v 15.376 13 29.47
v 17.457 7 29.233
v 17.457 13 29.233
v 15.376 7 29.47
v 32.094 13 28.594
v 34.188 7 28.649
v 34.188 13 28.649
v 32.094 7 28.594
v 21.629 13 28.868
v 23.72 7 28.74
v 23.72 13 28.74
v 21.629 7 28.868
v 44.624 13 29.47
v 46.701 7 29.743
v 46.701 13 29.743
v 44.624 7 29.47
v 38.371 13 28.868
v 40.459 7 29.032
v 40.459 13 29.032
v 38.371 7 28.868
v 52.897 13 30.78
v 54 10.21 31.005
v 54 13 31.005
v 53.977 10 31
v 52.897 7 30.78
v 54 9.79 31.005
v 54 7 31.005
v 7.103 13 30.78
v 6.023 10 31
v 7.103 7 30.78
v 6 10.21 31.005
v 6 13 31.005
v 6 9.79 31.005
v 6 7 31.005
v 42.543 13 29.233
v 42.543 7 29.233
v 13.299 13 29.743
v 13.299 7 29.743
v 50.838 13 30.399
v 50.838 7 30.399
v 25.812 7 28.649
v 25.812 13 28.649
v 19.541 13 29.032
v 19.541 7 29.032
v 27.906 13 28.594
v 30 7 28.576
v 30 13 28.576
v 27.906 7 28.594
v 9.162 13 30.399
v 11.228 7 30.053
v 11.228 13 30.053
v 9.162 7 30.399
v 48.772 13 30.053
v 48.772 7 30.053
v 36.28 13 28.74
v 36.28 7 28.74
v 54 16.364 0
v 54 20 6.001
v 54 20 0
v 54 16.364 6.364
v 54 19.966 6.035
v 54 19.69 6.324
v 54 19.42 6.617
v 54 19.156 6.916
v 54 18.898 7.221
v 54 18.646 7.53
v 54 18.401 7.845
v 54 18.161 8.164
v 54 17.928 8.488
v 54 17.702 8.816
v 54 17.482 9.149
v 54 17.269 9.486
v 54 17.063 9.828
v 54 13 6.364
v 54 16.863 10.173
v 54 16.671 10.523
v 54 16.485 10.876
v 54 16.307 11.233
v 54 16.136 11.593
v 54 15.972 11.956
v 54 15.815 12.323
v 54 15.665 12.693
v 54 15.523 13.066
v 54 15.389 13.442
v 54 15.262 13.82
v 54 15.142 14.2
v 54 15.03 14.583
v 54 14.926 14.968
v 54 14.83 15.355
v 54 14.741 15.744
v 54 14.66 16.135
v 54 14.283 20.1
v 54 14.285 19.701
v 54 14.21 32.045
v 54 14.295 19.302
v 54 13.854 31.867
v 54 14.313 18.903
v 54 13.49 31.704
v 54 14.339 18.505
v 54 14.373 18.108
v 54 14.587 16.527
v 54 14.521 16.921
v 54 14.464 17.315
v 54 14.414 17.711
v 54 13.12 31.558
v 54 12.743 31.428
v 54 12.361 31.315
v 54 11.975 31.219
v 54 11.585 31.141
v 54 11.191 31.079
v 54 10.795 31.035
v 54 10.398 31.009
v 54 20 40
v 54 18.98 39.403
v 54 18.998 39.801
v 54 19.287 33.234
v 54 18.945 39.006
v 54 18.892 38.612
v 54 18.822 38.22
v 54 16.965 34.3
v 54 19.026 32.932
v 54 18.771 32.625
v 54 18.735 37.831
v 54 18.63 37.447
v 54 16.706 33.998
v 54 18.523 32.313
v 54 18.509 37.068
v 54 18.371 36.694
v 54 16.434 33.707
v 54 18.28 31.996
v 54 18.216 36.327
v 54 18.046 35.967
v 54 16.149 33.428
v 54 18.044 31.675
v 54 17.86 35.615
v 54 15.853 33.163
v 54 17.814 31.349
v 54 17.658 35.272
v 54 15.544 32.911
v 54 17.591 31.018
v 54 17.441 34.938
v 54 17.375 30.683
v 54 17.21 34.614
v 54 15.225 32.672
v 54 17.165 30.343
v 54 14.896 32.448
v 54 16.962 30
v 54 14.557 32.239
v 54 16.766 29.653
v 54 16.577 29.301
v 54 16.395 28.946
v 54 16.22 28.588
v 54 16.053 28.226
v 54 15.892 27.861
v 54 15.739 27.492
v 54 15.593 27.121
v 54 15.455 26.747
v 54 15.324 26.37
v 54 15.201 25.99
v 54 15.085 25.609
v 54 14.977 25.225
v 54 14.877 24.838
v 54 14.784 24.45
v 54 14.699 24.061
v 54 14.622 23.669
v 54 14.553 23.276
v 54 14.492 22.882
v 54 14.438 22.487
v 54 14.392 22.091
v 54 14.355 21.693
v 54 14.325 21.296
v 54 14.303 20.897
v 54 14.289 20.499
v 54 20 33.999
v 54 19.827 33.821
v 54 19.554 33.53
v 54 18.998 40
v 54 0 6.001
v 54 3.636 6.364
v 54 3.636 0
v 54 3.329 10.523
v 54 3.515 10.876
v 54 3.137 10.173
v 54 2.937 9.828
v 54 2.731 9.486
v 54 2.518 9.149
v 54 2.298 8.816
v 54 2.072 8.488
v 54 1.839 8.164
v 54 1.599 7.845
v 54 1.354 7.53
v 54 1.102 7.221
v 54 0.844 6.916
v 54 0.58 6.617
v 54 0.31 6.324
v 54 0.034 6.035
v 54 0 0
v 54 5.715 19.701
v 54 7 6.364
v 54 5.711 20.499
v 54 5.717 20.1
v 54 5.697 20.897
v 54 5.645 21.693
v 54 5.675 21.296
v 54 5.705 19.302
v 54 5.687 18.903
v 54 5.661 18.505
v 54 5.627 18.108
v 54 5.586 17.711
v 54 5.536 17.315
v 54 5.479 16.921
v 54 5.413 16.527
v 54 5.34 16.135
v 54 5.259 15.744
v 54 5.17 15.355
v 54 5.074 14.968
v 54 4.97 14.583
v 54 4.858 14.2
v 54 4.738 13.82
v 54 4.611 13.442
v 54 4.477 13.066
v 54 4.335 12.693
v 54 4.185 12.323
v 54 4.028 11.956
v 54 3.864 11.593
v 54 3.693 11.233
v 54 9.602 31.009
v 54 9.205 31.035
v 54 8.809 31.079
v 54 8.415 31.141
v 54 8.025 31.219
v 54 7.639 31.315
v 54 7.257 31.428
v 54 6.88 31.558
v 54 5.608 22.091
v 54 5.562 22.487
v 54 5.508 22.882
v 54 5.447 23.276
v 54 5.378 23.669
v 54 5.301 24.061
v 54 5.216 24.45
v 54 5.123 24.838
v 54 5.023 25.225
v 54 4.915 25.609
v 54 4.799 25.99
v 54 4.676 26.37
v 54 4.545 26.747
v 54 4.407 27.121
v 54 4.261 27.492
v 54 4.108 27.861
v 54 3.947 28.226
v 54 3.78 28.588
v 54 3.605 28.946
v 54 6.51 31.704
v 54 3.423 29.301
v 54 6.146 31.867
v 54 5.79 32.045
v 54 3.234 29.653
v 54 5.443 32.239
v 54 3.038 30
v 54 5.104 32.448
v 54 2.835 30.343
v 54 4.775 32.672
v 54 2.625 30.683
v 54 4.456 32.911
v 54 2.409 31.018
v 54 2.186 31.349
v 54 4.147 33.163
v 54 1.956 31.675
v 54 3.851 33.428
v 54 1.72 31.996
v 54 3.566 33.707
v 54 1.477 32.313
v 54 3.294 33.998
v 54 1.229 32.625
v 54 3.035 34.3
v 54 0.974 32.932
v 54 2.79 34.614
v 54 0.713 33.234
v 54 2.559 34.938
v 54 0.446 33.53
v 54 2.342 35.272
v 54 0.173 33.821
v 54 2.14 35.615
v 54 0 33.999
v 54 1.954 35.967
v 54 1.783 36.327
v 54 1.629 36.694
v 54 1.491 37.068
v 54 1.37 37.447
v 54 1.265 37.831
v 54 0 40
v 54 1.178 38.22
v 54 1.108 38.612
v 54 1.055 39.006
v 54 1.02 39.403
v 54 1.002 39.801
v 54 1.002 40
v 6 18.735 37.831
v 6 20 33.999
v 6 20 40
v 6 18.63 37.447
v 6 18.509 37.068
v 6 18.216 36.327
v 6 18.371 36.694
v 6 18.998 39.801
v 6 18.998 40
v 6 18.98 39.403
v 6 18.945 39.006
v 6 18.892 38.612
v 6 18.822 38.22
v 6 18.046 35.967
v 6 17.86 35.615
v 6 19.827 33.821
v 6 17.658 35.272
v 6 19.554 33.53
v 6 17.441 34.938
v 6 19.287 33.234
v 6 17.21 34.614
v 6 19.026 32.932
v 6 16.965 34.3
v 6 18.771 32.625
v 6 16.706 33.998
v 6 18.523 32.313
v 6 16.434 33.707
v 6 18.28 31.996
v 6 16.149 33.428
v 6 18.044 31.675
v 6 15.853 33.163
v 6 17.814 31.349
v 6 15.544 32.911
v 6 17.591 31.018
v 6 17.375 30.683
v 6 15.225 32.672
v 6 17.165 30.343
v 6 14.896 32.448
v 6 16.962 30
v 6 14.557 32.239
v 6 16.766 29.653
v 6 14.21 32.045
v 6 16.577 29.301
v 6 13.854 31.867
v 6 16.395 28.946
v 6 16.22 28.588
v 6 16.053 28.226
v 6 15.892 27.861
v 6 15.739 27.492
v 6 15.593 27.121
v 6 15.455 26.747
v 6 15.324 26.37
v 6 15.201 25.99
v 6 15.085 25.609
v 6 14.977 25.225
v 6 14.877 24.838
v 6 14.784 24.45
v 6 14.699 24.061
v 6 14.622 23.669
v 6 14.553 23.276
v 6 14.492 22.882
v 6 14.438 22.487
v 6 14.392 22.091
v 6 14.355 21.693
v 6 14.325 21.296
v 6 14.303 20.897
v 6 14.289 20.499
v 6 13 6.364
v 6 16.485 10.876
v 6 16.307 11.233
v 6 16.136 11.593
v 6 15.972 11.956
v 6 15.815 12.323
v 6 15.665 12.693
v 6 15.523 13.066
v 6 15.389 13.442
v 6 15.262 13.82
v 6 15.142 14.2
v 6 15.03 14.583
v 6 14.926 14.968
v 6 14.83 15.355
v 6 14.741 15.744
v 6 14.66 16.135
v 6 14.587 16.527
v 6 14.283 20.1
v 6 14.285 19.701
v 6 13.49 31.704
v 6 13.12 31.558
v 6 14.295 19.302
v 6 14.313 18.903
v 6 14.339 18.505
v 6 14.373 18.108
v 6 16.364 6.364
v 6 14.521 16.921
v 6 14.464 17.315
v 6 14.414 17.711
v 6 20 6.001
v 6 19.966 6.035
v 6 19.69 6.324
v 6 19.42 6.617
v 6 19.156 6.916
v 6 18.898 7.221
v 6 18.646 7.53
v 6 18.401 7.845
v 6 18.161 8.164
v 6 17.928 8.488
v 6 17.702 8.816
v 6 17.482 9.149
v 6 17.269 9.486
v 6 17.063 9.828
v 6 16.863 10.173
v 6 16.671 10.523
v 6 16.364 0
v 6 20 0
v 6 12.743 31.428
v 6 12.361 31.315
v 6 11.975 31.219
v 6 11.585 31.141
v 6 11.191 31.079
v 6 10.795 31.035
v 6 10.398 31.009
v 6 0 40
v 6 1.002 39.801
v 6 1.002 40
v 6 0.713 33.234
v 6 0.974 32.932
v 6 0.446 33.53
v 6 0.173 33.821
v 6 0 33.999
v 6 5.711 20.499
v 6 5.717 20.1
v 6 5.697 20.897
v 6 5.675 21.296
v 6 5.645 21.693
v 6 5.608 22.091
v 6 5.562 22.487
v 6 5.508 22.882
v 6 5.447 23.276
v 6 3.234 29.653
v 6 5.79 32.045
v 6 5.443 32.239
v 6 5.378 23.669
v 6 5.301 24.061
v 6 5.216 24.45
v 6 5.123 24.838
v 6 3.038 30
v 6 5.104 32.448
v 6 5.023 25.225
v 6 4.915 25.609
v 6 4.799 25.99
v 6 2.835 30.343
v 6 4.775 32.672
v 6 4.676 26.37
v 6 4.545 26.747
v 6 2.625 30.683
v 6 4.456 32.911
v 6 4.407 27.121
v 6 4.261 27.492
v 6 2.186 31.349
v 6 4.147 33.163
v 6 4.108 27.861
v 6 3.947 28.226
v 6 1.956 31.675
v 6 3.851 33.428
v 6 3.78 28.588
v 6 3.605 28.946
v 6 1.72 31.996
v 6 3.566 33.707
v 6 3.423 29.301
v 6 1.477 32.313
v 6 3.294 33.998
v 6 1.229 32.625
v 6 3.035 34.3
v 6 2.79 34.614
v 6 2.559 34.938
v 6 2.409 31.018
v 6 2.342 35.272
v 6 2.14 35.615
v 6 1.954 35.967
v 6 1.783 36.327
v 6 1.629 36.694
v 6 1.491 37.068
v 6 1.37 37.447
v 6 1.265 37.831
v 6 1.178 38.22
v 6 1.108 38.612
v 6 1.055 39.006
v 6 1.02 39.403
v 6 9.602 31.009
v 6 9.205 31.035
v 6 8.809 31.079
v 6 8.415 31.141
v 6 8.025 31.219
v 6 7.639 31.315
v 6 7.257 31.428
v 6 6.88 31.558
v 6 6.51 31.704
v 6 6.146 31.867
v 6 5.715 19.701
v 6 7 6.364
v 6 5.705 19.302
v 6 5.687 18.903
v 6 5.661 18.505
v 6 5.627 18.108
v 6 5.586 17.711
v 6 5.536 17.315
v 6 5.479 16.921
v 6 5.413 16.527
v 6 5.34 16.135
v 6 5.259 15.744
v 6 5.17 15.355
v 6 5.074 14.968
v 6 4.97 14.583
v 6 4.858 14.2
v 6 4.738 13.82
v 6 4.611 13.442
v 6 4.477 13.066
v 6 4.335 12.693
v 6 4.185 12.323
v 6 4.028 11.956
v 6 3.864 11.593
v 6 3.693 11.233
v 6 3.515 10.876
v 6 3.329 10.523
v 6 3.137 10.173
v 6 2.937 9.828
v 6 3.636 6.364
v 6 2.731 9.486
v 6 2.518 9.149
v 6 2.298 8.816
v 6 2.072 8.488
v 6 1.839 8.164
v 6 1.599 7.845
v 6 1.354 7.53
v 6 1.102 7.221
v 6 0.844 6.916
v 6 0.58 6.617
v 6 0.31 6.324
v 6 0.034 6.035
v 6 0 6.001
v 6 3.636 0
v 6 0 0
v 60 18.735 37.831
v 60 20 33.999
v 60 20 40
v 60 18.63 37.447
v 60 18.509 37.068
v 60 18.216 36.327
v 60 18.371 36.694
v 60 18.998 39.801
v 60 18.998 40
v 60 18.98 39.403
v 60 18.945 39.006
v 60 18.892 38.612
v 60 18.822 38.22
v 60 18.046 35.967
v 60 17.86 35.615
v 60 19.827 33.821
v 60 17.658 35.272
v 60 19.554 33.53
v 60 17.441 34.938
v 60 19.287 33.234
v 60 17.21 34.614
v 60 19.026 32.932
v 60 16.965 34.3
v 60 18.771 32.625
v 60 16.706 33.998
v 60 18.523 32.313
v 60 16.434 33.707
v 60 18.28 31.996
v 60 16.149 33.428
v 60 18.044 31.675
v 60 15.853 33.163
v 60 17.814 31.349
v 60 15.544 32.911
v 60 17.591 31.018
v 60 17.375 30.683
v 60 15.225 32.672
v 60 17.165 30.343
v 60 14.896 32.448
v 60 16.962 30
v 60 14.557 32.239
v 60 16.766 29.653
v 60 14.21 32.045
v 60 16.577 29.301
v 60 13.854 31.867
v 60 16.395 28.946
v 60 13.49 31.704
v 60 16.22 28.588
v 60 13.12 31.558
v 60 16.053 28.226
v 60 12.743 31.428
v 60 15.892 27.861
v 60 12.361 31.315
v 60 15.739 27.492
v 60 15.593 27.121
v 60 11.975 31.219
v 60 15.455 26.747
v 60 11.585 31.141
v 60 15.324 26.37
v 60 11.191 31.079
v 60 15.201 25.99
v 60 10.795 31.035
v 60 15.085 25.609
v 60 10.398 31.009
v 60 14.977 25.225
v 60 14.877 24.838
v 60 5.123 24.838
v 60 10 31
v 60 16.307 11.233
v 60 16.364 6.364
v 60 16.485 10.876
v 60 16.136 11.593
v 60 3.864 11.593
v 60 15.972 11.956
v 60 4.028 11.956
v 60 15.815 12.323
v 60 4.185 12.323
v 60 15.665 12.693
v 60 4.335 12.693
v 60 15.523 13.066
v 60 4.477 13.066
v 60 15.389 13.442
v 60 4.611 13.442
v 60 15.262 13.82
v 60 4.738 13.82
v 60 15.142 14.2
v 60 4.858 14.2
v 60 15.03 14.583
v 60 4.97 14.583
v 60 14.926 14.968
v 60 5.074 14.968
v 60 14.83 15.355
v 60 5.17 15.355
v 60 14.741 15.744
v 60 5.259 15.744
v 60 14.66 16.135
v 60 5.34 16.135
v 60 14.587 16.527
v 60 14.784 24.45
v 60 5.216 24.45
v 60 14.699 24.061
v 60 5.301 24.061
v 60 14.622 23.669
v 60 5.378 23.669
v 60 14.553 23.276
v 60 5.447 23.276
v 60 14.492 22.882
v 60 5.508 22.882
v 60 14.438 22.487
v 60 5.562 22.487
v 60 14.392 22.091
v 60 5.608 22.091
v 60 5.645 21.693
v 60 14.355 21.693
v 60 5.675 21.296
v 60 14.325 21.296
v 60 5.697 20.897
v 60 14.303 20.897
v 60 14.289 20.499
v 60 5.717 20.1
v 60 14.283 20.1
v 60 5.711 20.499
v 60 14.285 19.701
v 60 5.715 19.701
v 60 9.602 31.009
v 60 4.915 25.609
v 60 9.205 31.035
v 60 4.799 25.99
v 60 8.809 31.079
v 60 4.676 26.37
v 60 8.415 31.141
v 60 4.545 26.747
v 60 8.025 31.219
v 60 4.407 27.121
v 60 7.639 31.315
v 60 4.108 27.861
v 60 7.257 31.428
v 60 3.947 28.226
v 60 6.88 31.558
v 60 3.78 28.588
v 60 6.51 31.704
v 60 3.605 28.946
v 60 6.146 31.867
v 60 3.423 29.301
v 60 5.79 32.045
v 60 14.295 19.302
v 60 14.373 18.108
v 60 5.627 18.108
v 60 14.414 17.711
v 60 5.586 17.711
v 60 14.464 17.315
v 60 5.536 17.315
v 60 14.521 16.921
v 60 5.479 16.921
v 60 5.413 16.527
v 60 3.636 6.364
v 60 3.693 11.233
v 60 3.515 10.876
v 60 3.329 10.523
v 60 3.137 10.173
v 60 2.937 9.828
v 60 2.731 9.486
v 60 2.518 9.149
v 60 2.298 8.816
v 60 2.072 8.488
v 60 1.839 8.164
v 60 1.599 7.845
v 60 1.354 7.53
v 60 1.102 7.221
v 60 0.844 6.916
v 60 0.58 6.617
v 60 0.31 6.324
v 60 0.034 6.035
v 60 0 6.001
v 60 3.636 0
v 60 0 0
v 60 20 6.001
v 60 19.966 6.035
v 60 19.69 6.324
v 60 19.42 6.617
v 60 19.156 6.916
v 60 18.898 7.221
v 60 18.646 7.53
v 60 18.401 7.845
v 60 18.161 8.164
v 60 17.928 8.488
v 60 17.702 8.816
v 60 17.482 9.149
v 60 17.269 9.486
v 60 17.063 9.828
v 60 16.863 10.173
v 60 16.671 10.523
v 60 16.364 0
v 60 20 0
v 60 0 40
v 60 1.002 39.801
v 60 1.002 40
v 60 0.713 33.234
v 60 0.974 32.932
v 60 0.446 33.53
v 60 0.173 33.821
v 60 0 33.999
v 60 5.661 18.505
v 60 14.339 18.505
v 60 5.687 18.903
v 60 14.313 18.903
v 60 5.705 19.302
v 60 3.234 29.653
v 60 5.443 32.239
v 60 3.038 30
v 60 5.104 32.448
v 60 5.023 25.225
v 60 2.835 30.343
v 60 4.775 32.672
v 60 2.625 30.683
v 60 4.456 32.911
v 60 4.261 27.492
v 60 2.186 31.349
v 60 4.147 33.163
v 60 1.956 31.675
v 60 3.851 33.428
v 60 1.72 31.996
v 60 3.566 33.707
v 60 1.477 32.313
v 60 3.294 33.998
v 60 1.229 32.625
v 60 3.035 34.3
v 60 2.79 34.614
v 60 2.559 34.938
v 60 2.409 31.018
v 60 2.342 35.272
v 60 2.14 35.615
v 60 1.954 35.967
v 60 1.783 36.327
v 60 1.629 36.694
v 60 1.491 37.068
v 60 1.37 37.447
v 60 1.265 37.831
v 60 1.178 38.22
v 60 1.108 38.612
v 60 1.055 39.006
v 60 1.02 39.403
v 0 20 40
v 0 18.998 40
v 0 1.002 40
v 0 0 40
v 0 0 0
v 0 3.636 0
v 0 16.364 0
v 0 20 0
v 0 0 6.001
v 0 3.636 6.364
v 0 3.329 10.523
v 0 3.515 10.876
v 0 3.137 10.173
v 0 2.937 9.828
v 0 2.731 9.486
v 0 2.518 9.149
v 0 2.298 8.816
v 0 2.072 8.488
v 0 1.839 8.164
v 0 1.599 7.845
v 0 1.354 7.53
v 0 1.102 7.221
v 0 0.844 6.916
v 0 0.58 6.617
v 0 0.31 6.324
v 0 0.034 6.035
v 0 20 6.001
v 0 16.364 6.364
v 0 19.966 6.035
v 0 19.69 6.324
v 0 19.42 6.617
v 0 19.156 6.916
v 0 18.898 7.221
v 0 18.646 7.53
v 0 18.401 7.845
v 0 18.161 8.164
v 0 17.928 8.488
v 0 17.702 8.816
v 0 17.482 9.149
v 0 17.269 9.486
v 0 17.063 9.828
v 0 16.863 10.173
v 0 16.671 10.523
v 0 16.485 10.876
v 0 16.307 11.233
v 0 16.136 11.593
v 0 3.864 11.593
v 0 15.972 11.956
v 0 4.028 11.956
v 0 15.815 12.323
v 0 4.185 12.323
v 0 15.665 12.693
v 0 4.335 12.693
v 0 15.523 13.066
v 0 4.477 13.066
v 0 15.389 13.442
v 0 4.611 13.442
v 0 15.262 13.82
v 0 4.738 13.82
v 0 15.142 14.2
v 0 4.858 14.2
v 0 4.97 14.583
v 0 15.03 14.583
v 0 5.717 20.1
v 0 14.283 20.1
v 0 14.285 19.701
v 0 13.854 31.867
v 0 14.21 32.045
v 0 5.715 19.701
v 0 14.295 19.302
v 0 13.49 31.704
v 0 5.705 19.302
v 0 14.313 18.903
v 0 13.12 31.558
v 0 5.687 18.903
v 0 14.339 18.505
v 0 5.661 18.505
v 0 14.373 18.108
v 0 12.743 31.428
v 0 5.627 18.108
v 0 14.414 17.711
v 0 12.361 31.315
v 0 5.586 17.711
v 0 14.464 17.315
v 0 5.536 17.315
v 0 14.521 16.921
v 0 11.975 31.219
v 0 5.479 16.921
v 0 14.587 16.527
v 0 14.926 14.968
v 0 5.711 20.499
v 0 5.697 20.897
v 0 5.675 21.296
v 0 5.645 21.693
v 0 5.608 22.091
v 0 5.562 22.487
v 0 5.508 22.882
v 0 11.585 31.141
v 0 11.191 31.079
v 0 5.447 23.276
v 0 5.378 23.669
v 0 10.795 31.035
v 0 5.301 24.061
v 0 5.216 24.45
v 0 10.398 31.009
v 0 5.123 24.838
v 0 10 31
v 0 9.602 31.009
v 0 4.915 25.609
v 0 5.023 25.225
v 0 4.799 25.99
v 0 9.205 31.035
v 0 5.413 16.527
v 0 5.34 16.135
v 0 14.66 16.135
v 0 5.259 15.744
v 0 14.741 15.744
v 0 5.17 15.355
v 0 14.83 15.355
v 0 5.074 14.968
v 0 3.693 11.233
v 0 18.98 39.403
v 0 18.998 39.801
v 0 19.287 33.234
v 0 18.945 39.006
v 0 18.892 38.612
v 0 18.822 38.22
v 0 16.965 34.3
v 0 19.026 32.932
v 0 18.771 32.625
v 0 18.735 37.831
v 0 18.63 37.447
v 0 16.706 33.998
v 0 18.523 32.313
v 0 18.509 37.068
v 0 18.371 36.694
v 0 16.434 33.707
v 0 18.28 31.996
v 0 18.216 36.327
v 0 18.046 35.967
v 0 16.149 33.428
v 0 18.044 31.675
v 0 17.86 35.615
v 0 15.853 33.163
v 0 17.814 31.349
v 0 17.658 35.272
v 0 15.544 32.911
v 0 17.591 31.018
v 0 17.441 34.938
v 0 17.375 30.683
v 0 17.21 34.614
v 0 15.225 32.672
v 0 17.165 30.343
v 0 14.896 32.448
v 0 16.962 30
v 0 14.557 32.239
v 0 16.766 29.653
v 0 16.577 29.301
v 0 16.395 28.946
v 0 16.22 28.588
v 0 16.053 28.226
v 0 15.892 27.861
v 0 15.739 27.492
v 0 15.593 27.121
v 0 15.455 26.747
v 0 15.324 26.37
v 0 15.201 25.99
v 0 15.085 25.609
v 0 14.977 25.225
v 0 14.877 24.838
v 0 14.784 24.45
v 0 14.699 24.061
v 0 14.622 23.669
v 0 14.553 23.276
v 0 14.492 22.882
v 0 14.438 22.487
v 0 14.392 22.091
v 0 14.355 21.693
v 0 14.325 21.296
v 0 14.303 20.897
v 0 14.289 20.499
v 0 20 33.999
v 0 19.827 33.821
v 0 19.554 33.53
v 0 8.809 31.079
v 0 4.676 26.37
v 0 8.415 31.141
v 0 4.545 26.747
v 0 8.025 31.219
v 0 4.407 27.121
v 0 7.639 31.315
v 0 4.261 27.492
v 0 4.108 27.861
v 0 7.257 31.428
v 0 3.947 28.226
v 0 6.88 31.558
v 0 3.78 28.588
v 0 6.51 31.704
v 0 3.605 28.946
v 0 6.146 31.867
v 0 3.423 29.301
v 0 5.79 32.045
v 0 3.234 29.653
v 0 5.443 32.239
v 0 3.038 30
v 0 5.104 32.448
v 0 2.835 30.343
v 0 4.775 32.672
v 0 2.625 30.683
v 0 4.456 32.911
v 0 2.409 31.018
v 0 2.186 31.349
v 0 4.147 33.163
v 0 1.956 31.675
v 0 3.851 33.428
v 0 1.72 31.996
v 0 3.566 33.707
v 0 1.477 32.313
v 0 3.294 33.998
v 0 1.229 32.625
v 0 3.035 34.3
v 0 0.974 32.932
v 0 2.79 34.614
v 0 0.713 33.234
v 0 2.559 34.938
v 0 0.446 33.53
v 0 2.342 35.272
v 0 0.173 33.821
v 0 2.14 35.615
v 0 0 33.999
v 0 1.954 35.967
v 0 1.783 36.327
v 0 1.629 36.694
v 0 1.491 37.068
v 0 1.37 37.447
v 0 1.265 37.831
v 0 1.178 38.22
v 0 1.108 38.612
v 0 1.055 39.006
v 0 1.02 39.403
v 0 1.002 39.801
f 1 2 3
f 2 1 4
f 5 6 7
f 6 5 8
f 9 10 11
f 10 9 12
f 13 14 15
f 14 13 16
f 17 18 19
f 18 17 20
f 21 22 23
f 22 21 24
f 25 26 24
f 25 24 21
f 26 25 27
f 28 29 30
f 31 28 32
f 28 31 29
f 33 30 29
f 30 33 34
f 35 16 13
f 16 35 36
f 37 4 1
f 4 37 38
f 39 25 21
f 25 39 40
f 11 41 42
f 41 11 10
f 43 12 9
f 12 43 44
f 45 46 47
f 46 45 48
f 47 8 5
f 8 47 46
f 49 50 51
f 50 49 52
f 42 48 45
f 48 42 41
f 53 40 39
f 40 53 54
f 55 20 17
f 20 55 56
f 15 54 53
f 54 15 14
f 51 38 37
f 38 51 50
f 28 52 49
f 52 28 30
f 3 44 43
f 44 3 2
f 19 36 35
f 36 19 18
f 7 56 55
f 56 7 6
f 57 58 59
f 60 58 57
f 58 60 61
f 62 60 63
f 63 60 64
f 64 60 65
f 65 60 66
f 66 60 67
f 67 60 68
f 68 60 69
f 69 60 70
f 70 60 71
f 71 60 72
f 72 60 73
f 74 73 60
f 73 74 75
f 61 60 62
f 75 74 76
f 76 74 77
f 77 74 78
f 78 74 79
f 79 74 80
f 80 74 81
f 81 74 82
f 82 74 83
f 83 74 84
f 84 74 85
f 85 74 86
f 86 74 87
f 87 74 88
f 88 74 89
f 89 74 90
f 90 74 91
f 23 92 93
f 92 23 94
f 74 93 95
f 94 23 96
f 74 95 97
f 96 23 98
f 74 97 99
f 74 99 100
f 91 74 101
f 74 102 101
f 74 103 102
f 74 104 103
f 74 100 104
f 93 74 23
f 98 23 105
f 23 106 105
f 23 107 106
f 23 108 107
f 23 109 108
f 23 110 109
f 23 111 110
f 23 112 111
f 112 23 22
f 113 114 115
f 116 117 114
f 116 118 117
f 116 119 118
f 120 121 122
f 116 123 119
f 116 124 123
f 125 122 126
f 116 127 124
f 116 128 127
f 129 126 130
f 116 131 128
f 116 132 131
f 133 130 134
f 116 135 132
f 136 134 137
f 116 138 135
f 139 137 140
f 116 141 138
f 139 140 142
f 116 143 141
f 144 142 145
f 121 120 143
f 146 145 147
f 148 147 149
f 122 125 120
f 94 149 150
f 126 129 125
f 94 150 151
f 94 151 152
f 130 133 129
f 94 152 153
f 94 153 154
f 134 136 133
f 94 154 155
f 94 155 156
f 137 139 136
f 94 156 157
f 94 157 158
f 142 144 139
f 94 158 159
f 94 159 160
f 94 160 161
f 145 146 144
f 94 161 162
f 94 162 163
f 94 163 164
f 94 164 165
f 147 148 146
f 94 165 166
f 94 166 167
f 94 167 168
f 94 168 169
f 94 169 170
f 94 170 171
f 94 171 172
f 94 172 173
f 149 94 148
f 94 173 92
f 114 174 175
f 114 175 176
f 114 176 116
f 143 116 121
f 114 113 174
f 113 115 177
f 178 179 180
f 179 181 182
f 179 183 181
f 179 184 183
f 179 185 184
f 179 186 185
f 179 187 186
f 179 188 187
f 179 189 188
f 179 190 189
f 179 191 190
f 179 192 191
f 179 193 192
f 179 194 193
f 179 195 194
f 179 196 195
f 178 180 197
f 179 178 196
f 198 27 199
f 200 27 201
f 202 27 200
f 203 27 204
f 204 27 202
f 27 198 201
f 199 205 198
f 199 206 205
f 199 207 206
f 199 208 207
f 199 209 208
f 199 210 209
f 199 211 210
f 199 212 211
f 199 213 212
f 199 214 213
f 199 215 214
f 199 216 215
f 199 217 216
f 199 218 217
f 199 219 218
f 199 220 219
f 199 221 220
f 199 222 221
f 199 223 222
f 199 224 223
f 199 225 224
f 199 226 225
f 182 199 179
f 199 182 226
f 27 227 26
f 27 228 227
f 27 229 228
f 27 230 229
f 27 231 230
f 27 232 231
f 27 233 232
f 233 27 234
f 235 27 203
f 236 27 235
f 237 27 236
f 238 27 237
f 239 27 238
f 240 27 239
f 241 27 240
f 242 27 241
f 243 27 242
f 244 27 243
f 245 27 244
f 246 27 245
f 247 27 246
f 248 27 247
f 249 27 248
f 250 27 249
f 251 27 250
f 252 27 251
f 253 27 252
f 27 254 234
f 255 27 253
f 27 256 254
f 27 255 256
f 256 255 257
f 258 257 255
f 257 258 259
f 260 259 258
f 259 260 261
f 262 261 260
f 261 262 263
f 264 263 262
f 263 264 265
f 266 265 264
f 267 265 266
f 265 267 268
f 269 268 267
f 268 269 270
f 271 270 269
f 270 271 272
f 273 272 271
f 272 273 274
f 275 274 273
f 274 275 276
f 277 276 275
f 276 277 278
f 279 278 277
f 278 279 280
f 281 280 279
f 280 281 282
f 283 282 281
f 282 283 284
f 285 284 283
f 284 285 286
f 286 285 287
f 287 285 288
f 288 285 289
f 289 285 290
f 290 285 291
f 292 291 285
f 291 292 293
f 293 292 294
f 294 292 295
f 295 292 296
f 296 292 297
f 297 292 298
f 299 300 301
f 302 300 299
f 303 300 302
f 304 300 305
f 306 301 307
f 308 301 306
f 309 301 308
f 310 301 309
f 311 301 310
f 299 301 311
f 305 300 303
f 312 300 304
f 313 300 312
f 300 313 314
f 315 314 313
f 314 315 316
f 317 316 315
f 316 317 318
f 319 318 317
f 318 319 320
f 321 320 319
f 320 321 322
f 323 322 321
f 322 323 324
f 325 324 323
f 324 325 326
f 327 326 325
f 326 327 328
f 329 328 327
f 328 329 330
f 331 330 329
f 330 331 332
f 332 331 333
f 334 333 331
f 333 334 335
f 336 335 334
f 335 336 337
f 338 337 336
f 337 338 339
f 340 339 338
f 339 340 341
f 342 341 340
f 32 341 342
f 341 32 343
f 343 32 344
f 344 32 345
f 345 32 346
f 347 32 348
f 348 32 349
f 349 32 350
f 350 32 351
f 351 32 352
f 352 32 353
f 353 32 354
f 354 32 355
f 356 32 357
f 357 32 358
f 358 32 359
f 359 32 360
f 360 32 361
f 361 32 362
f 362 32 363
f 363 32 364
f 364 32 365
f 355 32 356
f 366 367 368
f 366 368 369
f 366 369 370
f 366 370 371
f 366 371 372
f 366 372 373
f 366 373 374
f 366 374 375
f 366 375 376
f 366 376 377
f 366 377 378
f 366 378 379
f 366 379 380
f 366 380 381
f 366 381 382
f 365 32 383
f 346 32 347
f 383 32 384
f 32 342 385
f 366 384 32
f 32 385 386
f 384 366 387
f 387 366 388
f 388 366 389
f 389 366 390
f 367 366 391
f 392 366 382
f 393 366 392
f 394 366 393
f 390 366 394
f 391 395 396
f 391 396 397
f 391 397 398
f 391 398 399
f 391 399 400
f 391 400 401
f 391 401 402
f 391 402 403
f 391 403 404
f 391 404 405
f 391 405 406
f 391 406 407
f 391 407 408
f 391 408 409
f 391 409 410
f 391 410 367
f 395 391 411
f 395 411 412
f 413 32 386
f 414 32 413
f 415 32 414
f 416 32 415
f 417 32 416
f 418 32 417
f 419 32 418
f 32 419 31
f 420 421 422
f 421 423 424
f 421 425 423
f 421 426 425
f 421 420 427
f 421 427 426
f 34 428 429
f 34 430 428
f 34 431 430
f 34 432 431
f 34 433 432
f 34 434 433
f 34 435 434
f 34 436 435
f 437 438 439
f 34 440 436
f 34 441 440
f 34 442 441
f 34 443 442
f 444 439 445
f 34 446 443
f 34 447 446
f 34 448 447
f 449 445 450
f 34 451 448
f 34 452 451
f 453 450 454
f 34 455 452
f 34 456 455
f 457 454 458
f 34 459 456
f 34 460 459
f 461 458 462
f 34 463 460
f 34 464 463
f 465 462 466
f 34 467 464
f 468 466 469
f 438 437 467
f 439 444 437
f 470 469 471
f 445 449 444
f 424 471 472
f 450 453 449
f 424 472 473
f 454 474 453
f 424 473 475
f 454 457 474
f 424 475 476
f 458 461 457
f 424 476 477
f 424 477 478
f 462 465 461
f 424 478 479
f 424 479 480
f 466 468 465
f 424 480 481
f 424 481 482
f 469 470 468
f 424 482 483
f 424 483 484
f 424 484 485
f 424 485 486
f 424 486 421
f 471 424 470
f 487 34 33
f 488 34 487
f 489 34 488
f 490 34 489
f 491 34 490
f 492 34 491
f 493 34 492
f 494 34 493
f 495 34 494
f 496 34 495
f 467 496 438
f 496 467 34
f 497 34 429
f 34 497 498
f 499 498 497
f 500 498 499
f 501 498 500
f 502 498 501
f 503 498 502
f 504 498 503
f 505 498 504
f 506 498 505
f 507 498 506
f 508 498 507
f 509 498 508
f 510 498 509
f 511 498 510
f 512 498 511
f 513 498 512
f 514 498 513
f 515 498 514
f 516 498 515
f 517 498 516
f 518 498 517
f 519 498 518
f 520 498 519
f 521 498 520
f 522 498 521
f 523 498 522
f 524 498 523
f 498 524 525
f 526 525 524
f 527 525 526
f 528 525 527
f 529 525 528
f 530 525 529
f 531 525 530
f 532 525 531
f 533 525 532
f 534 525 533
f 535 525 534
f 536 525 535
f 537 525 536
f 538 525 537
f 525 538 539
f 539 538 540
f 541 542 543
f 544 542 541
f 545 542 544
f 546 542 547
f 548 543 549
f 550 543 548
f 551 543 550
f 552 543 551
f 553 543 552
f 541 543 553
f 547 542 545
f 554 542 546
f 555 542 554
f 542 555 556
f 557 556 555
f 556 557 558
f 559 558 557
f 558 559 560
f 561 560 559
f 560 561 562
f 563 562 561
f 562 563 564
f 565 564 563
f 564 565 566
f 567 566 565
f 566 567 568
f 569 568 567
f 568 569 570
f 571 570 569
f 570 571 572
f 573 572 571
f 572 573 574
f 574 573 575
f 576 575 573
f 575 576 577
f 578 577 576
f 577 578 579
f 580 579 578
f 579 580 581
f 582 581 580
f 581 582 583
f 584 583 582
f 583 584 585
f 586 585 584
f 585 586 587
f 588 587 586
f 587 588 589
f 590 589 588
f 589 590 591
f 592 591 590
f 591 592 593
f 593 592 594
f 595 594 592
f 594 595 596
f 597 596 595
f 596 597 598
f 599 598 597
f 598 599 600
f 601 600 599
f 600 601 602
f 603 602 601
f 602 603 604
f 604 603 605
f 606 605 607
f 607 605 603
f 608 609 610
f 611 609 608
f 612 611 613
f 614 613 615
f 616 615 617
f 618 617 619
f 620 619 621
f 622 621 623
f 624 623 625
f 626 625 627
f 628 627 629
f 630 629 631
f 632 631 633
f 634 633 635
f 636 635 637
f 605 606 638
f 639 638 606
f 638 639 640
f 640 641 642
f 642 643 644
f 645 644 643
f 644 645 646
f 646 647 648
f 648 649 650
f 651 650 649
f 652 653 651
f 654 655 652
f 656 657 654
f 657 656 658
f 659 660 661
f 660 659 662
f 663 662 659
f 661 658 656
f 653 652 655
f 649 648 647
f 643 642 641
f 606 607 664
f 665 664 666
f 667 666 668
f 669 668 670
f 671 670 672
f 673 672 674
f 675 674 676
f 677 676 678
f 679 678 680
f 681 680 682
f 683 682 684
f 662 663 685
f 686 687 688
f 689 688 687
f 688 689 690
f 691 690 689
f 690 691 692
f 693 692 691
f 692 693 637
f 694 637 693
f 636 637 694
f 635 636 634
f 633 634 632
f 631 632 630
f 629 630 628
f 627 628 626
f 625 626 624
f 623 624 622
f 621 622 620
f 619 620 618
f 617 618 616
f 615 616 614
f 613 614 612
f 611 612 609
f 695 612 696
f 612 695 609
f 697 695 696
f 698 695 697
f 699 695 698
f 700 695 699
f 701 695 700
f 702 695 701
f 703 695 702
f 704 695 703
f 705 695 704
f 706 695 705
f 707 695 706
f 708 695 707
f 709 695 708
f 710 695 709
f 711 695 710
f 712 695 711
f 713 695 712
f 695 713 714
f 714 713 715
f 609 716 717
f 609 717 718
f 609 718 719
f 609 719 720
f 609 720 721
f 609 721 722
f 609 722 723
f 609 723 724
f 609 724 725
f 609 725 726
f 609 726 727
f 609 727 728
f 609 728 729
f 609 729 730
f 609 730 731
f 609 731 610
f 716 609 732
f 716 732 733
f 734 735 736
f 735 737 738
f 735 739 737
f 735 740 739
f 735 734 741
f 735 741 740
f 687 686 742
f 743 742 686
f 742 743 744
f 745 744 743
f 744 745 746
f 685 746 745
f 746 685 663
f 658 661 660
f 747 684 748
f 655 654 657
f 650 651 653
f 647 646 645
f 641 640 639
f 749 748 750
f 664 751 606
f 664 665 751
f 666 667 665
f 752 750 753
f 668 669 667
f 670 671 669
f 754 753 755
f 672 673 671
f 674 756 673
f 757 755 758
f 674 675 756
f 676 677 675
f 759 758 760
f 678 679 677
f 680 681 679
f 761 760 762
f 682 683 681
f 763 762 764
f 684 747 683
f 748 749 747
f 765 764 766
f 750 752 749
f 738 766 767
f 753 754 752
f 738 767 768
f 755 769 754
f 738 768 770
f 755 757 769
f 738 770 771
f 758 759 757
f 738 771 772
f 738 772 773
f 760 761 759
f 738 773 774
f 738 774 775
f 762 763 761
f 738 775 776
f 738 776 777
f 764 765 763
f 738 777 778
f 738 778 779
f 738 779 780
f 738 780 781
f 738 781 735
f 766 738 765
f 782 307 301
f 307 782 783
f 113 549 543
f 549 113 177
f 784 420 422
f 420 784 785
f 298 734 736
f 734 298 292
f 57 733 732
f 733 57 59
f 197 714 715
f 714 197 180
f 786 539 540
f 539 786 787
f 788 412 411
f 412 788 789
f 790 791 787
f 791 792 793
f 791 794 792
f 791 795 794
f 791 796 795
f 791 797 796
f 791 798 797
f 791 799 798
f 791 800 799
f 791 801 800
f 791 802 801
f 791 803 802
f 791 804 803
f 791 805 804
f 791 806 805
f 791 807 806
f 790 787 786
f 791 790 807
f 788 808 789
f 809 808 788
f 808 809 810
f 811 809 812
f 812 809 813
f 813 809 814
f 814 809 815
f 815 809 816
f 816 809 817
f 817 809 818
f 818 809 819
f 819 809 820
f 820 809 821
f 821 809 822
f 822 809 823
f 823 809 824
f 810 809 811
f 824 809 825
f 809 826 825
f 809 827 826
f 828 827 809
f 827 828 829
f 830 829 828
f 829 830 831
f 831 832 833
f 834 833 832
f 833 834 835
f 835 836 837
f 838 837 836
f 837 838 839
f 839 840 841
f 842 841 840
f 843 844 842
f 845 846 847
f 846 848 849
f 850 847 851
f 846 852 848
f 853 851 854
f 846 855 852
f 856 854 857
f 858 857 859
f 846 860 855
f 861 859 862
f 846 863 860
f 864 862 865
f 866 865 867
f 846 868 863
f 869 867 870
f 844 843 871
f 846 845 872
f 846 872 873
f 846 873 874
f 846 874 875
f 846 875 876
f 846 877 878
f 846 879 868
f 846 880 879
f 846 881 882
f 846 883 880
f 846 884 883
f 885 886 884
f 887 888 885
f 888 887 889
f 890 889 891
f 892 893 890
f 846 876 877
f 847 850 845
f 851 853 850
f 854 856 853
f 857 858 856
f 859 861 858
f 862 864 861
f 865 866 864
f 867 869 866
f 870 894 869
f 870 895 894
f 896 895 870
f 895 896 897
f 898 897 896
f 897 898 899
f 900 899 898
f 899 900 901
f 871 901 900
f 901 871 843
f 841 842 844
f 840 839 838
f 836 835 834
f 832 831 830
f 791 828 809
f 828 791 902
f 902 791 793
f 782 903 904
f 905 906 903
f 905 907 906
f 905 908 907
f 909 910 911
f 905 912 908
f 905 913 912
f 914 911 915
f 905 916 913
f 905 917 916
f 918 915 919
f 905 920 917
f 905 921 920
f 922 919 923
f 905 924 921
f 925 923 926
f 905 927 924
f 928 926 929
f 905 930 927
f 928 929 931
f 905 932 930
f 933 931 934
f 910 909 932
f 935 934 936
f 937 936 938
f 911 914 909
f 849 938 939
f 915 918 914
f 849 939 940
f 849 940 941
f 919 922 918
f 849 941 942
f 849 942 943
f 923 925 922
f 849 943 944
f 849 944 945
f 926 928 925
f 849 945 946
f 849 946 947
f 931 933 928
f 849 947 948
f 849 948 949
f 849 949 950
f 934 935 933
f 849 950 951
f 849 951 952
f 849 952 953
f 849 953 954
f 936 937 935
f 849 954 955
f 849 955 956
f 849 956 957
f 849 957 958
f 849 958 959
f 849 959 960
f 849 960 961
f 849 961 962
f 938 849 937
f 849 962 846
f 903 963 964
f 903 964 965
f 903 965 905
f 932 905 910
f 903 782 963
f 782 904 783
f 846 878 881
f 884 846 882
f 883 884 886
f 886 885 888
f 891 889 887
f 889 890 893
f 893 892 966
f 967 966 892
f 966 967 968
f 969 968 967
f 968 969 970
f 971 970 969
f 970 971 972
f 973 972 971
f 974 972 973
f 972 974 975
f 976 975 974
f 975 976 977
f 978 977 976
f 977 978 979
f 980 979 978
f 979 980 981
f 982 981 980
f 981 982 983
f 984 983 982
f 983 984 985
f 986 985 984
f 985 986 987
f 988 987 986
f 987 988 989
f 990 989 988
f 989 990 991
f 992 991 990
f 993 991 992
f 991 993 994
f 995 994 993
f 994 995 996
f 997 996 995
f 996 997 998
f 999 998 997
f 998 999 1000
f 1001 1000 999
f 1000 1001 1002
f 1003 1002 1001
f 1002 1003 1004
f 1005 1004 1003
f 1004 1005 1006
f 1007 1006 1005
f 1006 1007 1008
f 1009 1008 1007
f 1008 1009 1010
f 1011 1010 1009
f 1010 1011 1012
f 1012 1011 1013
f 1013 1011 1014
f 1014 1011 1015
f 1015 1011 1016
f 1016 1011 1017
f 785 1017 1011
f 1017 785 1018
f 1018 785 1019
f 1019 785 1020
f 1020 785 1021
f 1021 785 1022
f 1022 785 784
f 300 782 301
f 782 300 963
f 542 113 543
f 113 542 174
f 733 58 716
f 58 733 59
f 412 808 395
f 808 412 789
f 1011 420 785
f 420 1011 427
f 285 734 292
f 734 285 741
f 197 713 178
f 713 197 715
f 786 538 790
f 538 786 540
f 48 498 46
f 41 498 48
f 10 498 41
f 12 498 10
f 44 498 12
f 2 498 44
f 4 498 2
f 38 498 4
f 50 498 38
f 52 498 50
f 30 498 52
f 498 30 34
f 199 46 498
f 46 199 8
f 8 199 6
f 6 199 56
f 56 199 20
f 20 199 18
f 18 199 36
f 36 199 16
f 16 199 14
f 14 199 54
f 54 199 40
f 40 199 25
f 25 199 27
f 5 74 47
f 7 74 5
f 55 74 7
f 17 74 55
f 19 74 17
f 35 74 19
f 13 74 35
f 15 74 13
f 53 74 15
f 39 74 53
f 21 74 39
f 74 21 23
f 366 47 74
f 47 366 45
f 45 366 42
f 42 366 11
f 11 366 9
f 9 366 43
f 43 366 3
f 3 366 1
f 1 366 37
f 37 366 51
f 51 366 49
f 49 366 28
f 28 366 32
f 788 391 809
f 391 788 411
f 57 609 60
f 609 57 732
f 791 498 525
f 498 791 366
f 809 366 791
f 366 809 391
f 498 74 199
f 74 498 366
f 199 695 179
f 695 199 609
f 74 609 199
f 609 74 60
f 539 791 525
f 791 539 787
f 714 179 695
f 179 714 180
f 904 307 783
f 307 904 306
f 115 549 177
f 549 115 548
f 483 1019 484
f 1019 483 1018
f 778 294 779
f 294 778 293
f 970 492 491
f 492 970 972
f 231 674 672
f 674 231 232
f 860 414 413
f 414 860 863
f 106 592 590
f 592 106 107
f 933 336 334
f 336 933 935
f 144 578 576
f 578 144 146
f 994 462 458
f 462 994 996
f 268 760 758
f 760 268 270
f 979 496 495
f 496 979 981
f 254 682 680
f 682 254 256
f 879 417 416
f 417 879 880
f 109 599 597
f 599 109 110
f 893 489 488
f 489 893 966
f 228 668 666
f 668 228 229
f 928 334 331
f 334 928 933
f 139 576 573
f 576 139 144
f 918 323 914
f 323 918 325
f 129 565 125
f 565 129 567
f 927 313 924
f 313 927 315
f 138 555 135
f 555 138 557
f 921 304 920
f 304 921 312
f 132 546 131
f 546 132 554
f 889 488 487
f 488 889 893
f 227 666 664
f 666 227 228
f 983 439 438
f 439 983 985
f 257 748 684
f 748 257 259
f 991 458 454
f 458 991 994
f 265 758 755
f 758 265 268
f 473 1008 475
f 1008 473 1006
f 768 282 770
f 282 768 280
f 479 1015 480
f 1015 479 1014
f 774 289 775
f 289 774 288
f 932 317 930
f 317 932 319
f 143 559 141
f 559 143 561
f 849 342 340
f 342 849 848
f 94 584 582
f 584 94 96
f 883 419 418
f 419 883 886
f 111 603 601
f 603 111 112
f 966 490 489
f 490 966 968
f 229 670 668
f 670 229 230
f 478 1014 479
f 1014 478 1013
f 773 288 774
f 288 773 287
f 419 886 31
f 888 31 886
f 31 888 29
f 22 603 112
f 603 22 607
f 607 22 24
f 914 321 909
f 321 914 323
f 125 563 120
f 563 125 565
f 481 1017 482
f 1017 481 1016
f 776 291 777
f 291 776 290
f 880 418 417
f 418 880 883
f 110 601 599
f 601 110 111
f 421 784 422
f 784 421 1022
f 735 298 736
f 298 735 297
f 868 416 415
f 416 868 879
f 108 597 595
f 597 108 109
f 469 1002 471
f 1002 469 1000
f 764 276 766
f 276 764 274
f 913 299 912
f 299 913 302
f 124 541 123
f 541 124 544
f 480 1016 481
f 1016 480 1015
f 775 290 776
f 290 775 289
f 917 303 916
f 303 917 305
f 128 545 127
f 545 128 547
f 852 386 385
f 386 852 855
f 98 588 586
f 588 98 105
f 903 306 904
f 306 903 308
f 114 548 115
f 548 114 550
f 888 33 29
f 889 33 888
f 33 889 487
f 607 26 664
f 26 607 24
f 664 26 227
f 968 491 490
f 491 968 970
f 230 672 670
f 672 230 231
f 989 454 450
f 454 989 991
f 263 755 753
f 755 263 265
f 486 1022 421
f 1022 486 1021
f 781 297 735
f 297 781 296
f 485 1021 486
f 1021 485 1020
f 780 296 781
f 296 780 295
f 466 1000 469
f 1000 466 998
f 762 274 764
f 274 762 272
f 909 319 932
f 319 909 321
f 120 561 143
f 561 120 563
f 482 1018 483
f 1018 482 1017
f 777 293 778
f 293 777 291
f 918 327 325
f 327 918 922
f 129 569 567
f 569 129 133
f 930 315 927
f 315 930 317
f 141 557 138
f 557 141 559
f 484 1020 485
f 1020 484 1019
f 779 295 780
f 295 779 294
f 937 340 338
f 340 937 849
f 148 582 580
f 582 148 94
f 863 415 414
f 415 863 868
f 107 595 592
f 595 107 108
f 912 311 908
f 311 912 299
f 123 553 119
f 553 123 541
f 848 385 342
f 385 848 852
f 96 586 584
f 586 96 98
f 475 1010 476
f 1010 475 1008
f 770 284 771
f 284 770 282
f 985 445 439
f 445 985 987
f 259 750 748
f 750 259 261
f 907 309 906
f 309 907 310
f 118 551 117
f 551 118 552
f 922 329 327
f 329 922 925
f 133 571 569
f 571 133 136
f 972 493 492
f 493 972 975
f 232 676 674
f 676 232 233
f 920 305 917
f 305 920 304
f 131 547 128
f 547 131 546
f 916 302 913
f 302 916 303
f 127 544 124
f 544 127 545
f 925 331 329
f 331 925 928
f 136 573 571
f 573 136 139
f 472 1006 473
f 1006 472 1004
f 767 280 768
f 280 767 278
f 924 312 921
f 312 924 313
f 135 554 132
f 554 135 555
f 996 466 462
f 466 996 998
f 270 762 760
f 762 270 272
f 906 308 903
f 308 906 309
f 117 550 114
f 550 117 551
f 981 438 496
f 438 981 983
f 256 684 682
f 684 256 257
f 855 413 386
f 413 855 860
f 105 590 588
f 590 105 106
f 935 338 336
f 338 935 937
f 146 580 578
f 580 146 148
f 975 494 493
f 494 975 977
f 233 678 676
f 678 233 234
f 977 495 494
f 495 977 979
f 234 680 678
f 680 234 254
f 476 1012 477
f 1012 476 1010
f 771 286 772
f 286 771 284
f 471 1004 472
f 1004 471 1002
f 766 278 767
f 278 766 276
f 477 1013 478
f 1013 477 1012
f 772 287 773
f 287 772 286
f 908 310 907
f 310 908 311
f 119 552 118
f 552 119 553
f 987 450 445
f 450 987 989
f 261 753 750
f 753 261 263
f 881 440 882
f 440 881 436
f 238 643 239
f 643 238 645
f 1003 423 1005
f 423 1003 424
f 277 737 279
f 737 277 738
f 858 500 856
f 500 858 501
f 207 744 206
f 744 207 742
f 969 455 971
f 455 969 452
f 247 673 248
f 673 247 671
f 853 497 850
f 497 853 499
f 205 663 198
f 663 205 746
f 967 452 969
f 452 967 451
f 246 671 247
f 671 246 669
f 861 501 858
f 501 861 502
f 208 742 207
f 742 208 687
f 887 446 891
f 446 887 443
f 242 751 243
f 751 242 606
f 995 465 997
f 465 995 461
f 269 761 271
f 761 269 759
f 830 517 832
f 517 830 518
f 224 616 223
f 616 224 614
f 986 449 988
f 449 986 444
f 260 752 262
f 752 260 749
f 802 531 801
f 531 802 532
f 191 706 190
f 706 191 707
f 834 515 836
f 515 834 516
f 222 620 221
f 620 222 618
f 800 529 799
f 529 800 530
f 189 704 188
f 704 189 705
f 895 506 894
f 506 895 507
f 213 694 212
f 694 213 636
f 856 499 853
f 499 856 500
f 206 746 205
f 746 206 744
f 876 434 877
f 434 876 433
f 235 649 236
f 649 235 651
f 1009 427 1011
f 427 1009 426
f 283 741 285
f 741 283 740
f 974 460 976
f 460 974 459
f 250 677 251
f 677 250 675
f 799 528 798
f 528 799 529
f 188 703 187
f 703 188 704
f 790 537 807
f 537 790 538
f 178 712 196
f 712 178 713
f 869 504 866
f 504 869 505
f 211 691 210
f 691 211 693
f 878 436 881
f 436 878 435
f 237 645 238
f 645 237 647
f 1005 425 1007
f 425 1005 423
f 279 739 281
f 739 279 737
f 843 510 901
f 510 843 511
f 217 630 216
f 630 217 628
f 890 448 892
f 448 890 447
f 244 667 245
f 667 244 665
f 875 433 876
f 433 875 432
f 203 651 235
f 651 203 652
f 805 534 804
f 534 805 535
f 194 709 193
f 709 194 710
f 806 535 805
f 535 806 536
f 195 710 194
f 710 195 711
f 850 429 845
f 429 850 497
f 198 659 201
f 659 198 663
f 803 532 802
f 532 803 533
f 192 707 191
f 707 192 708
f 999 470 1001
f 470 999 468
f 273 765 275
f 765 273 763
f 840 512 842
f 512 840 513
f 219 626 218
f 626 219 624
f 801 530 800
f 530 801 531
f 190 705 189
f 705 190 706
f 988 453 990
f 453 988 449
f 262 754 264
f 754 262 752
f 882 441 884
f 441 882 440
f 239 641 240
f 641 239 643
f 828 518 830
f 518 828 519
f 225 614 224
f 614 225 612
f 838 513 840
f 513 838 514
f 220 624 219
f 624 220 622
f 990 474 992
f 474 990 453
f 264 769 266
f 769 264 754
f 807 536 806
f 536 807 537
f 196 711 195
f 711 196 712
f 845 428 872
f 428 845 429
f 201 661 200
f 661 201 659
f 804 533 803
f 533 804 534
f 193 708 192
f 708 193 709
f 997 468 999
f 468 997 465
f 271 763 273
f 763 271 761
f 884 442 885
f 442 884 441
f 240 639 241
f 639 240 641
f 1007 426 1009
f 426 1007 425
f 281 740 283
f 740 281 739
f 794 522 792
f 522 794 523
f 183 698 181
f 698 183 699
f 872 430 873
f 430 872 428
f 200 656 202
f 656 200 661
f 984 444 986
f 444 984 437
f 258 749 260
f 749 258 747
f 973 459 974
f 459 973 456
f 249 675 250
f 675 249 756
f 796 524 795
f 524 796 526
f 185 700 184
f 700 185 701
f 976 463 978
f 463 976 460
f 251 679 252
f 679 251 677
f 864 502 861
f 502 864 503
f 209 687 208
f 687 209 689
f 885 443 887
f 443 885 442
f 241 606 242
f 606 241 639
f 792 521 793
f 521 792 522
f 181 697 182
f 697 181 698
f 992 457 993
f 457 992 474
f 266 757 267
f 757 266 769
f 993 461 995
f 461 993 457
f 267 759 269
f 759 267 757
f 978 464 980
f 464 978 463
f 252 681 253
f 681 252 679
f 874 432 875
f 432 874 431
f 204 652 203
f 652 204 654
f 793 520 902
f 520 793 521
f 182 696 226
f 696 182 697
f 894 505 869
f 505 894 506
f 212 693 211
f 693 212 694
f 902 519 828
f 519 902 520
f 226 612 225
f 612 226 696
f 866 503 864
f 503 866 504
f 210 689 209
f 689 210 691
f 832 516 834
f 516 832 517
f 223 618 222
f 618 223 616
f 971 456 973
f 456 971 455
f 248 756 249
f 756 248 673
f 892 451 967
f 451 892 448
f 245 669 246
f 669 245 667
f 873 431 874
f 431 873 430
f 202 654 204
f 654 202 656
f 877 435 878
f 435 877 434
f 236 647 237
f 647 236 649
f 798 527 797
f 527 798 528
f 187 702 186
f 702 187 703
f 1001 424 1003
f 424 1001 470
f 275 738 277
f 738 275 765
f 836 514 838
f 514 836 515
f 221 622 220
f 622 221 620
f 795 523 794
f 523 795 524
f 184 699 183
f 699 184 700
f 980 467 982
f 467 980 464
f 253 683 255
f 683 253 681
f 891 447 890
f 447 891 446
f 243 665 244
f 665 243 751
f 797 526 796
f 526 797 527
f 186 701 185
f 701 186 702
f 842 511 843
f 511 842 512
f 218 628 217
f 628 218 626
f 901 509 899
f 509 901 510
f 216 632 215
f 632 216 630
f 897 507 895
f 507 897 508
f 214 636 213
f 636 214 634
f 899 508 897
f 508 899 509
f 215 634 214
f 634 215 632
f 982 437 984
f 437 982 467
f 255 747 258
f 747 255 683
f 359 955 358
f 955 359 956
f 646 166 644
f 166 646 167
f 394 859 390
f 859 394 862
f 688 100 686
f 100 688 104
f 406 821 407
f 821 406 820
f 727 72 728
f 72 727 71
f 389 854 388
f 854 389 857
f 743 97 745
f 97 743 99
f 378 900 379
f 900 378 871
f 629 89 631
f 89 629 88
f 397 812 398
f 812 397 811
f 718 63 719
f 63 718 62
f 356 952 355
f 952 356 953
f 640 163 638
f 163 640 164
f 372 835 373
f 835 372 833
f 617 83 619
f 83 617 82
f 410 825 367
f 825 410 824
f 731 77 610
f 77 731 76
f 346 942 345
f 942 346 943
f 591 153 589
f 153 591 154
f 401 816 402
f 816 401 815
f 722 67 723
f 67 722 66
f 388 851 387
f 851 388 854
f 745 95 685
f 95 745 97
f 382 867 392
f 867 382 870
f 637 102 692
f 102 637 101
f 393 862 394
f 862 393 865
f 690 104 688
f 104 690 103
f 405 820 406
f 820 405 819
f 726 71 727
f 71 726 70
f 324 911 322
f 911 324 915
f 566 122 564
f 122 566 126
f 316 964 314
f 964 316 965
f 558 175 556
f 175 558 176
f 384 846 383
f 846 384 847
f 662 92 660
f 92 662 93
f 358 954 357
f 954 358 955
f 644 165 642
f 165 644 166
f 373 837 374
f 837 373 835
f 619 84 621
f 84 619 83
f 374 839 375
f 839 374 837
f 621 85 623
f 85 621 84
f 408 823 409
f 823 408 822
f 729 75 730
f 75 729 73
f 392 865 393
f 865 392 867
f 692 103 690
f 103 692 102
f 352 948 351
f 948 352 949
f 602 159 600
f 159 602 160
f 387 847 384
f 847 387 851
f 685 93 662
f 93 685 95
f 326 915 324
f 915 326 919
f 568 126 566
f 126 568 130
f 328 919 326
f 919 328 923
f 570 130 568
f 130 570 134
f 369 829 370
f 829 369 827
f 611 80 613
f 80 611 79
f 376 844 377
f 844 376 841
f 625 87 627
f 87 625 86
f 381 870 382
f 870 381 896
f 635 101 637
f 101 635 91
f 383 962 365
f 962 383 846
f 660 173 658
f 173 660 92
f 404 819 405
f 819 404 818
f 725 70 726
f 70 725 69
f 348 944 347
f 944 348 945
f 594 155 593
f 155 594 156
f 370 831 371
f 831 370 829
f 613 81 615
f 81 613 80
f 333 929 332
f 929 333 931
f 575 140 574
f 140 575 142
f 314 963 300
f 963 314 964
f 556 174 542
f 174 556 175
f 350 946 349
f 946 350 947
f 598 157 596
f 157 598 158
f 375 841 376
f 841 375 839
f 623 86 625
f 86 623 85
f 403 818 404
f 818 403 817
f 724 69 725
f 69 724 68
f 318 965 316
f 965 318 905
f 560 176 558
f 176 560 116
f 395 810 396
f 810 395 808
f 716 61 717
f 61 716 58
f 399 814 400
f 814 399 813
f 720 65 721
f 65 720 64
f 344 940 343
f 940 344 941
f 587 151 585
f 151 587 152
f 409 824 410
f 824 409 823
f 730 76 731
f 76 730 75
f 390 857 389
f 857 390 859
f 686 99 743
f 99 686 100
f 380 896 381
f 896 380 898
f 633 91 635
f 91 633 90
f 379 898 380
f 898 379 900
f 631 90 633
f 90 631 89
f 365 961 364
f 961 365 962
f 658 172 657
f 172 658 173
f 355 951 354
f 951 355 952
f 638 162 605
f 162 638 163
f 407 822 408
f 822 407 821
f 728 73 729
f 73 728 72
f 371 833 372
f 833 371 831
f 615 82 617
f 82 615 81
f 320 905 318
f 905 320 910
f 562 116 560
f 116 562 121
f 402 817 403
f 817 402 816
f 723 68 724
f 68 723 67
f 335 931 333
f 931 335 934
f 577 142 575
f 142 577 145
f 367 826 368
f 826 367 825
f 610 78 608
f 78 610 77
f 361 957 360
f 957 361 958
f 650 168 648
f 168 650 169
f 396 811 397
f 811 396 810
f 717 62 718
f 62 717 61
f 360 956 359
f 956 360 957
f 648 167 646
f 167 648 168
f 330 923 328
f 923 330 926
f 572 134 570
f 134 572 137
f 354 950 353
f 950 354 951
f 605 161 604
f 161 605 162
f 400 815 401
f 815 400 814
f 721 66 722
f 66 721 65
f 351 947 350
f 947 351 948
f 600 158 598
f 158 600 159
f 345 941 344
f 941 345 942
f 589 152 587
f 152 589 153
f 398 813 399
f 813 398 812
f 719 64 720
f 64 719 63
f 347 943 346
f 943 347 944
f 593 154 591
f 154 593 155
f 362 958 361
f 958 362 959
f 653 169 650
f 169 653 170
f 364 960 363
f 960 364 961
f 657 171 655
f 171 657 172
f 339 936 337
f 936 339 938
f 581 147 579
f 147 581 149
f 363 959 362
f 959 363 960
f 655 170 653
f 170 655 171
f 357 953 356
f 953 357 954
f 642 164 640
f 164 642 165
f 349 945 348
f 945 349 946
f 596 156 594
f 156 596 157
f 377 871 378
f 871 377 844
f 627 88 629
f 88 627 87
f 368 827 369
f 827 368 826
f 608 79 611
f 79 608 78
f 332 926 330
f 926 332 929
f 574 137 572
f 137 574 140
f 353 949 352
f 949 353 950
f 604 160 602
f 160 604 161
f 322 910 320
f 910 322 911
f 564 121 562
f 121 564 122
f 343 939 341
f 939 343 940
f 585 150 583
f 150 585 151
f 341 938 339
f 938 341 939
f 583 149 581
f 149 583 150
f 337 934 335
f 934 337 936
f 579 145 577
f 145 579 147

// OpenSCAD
length = 60;
width = 20;
height = 40;
thickness = 6;
leg_thickness = 1;
arc_height = 9; //Extra height at which the bottom arc starts.
arc_radius = length * 2;
arc_thickness = 22;
curve_radius = height / 2;
$fs = 0.4;
$fa = 1;

difference() {
	//Main volume we're carving from.
	cube([length, width, height]);

	intersection() {
		union() {
			//Top arc.
			translate([length / 2, -1, arc_radius + arc_height + arc_thickness - (1 - cos(asin((length / 2 - thickness) / arc_radius))) * arc_radius]) {
				rotate([-90, 0, 0]) {
					cylinder(r=arc_radius, h=width + 2);
				}
			}
		}
		translate([thickness, -2, -1]) {
			cube([length - thickness * 2, width + 4, height + 2]);
		}
	}

	//Arc sides.
	translate([thickness, -1, 0]) {
		cube([length - thickness * 2, (width - thickness) / 2 + 1, height]);
	}
	translate([thickness, (width + thickness) / 2, 0]) {
		cube([length - thickness * 2, (width - thickness) / 2 + 1, height]);
	}

	//Side legs.
	translate([-1, width / 2, 0]) {
		rotate([45, 0, 0]) {
			rotate([0, 90, 0]) {
				cylinder(r=width / 2 - leg_thickness, h=length + 2, $fn=4);
			}
		}
	}
	translate([-1, width / 2, height]) {
		rotate([0, 90, 0]) {
			cylinder(r=width / 2 - leg_thickness, h=length + 2);
		}
	}

	//Curves.
	translate([-1, -curve_radius + (1 - cos(asin((height / 2 - thickness) / curve_radius))) * curve_radius, height / 2]) {
		rotate([0, 90, 0]) {
			cylinder(r=curve_radius, h=length + 2);
		}
	}
	translate([-1, width + curve_radius - (1 - cos(asin((height / 2 - thickness) / curve_radius))) * curve_radius, height / 2]) {
		rotate([0, 90, 0]) {
			cylinder(r=curve_radius, h=length + 2);
		}
	}
}
